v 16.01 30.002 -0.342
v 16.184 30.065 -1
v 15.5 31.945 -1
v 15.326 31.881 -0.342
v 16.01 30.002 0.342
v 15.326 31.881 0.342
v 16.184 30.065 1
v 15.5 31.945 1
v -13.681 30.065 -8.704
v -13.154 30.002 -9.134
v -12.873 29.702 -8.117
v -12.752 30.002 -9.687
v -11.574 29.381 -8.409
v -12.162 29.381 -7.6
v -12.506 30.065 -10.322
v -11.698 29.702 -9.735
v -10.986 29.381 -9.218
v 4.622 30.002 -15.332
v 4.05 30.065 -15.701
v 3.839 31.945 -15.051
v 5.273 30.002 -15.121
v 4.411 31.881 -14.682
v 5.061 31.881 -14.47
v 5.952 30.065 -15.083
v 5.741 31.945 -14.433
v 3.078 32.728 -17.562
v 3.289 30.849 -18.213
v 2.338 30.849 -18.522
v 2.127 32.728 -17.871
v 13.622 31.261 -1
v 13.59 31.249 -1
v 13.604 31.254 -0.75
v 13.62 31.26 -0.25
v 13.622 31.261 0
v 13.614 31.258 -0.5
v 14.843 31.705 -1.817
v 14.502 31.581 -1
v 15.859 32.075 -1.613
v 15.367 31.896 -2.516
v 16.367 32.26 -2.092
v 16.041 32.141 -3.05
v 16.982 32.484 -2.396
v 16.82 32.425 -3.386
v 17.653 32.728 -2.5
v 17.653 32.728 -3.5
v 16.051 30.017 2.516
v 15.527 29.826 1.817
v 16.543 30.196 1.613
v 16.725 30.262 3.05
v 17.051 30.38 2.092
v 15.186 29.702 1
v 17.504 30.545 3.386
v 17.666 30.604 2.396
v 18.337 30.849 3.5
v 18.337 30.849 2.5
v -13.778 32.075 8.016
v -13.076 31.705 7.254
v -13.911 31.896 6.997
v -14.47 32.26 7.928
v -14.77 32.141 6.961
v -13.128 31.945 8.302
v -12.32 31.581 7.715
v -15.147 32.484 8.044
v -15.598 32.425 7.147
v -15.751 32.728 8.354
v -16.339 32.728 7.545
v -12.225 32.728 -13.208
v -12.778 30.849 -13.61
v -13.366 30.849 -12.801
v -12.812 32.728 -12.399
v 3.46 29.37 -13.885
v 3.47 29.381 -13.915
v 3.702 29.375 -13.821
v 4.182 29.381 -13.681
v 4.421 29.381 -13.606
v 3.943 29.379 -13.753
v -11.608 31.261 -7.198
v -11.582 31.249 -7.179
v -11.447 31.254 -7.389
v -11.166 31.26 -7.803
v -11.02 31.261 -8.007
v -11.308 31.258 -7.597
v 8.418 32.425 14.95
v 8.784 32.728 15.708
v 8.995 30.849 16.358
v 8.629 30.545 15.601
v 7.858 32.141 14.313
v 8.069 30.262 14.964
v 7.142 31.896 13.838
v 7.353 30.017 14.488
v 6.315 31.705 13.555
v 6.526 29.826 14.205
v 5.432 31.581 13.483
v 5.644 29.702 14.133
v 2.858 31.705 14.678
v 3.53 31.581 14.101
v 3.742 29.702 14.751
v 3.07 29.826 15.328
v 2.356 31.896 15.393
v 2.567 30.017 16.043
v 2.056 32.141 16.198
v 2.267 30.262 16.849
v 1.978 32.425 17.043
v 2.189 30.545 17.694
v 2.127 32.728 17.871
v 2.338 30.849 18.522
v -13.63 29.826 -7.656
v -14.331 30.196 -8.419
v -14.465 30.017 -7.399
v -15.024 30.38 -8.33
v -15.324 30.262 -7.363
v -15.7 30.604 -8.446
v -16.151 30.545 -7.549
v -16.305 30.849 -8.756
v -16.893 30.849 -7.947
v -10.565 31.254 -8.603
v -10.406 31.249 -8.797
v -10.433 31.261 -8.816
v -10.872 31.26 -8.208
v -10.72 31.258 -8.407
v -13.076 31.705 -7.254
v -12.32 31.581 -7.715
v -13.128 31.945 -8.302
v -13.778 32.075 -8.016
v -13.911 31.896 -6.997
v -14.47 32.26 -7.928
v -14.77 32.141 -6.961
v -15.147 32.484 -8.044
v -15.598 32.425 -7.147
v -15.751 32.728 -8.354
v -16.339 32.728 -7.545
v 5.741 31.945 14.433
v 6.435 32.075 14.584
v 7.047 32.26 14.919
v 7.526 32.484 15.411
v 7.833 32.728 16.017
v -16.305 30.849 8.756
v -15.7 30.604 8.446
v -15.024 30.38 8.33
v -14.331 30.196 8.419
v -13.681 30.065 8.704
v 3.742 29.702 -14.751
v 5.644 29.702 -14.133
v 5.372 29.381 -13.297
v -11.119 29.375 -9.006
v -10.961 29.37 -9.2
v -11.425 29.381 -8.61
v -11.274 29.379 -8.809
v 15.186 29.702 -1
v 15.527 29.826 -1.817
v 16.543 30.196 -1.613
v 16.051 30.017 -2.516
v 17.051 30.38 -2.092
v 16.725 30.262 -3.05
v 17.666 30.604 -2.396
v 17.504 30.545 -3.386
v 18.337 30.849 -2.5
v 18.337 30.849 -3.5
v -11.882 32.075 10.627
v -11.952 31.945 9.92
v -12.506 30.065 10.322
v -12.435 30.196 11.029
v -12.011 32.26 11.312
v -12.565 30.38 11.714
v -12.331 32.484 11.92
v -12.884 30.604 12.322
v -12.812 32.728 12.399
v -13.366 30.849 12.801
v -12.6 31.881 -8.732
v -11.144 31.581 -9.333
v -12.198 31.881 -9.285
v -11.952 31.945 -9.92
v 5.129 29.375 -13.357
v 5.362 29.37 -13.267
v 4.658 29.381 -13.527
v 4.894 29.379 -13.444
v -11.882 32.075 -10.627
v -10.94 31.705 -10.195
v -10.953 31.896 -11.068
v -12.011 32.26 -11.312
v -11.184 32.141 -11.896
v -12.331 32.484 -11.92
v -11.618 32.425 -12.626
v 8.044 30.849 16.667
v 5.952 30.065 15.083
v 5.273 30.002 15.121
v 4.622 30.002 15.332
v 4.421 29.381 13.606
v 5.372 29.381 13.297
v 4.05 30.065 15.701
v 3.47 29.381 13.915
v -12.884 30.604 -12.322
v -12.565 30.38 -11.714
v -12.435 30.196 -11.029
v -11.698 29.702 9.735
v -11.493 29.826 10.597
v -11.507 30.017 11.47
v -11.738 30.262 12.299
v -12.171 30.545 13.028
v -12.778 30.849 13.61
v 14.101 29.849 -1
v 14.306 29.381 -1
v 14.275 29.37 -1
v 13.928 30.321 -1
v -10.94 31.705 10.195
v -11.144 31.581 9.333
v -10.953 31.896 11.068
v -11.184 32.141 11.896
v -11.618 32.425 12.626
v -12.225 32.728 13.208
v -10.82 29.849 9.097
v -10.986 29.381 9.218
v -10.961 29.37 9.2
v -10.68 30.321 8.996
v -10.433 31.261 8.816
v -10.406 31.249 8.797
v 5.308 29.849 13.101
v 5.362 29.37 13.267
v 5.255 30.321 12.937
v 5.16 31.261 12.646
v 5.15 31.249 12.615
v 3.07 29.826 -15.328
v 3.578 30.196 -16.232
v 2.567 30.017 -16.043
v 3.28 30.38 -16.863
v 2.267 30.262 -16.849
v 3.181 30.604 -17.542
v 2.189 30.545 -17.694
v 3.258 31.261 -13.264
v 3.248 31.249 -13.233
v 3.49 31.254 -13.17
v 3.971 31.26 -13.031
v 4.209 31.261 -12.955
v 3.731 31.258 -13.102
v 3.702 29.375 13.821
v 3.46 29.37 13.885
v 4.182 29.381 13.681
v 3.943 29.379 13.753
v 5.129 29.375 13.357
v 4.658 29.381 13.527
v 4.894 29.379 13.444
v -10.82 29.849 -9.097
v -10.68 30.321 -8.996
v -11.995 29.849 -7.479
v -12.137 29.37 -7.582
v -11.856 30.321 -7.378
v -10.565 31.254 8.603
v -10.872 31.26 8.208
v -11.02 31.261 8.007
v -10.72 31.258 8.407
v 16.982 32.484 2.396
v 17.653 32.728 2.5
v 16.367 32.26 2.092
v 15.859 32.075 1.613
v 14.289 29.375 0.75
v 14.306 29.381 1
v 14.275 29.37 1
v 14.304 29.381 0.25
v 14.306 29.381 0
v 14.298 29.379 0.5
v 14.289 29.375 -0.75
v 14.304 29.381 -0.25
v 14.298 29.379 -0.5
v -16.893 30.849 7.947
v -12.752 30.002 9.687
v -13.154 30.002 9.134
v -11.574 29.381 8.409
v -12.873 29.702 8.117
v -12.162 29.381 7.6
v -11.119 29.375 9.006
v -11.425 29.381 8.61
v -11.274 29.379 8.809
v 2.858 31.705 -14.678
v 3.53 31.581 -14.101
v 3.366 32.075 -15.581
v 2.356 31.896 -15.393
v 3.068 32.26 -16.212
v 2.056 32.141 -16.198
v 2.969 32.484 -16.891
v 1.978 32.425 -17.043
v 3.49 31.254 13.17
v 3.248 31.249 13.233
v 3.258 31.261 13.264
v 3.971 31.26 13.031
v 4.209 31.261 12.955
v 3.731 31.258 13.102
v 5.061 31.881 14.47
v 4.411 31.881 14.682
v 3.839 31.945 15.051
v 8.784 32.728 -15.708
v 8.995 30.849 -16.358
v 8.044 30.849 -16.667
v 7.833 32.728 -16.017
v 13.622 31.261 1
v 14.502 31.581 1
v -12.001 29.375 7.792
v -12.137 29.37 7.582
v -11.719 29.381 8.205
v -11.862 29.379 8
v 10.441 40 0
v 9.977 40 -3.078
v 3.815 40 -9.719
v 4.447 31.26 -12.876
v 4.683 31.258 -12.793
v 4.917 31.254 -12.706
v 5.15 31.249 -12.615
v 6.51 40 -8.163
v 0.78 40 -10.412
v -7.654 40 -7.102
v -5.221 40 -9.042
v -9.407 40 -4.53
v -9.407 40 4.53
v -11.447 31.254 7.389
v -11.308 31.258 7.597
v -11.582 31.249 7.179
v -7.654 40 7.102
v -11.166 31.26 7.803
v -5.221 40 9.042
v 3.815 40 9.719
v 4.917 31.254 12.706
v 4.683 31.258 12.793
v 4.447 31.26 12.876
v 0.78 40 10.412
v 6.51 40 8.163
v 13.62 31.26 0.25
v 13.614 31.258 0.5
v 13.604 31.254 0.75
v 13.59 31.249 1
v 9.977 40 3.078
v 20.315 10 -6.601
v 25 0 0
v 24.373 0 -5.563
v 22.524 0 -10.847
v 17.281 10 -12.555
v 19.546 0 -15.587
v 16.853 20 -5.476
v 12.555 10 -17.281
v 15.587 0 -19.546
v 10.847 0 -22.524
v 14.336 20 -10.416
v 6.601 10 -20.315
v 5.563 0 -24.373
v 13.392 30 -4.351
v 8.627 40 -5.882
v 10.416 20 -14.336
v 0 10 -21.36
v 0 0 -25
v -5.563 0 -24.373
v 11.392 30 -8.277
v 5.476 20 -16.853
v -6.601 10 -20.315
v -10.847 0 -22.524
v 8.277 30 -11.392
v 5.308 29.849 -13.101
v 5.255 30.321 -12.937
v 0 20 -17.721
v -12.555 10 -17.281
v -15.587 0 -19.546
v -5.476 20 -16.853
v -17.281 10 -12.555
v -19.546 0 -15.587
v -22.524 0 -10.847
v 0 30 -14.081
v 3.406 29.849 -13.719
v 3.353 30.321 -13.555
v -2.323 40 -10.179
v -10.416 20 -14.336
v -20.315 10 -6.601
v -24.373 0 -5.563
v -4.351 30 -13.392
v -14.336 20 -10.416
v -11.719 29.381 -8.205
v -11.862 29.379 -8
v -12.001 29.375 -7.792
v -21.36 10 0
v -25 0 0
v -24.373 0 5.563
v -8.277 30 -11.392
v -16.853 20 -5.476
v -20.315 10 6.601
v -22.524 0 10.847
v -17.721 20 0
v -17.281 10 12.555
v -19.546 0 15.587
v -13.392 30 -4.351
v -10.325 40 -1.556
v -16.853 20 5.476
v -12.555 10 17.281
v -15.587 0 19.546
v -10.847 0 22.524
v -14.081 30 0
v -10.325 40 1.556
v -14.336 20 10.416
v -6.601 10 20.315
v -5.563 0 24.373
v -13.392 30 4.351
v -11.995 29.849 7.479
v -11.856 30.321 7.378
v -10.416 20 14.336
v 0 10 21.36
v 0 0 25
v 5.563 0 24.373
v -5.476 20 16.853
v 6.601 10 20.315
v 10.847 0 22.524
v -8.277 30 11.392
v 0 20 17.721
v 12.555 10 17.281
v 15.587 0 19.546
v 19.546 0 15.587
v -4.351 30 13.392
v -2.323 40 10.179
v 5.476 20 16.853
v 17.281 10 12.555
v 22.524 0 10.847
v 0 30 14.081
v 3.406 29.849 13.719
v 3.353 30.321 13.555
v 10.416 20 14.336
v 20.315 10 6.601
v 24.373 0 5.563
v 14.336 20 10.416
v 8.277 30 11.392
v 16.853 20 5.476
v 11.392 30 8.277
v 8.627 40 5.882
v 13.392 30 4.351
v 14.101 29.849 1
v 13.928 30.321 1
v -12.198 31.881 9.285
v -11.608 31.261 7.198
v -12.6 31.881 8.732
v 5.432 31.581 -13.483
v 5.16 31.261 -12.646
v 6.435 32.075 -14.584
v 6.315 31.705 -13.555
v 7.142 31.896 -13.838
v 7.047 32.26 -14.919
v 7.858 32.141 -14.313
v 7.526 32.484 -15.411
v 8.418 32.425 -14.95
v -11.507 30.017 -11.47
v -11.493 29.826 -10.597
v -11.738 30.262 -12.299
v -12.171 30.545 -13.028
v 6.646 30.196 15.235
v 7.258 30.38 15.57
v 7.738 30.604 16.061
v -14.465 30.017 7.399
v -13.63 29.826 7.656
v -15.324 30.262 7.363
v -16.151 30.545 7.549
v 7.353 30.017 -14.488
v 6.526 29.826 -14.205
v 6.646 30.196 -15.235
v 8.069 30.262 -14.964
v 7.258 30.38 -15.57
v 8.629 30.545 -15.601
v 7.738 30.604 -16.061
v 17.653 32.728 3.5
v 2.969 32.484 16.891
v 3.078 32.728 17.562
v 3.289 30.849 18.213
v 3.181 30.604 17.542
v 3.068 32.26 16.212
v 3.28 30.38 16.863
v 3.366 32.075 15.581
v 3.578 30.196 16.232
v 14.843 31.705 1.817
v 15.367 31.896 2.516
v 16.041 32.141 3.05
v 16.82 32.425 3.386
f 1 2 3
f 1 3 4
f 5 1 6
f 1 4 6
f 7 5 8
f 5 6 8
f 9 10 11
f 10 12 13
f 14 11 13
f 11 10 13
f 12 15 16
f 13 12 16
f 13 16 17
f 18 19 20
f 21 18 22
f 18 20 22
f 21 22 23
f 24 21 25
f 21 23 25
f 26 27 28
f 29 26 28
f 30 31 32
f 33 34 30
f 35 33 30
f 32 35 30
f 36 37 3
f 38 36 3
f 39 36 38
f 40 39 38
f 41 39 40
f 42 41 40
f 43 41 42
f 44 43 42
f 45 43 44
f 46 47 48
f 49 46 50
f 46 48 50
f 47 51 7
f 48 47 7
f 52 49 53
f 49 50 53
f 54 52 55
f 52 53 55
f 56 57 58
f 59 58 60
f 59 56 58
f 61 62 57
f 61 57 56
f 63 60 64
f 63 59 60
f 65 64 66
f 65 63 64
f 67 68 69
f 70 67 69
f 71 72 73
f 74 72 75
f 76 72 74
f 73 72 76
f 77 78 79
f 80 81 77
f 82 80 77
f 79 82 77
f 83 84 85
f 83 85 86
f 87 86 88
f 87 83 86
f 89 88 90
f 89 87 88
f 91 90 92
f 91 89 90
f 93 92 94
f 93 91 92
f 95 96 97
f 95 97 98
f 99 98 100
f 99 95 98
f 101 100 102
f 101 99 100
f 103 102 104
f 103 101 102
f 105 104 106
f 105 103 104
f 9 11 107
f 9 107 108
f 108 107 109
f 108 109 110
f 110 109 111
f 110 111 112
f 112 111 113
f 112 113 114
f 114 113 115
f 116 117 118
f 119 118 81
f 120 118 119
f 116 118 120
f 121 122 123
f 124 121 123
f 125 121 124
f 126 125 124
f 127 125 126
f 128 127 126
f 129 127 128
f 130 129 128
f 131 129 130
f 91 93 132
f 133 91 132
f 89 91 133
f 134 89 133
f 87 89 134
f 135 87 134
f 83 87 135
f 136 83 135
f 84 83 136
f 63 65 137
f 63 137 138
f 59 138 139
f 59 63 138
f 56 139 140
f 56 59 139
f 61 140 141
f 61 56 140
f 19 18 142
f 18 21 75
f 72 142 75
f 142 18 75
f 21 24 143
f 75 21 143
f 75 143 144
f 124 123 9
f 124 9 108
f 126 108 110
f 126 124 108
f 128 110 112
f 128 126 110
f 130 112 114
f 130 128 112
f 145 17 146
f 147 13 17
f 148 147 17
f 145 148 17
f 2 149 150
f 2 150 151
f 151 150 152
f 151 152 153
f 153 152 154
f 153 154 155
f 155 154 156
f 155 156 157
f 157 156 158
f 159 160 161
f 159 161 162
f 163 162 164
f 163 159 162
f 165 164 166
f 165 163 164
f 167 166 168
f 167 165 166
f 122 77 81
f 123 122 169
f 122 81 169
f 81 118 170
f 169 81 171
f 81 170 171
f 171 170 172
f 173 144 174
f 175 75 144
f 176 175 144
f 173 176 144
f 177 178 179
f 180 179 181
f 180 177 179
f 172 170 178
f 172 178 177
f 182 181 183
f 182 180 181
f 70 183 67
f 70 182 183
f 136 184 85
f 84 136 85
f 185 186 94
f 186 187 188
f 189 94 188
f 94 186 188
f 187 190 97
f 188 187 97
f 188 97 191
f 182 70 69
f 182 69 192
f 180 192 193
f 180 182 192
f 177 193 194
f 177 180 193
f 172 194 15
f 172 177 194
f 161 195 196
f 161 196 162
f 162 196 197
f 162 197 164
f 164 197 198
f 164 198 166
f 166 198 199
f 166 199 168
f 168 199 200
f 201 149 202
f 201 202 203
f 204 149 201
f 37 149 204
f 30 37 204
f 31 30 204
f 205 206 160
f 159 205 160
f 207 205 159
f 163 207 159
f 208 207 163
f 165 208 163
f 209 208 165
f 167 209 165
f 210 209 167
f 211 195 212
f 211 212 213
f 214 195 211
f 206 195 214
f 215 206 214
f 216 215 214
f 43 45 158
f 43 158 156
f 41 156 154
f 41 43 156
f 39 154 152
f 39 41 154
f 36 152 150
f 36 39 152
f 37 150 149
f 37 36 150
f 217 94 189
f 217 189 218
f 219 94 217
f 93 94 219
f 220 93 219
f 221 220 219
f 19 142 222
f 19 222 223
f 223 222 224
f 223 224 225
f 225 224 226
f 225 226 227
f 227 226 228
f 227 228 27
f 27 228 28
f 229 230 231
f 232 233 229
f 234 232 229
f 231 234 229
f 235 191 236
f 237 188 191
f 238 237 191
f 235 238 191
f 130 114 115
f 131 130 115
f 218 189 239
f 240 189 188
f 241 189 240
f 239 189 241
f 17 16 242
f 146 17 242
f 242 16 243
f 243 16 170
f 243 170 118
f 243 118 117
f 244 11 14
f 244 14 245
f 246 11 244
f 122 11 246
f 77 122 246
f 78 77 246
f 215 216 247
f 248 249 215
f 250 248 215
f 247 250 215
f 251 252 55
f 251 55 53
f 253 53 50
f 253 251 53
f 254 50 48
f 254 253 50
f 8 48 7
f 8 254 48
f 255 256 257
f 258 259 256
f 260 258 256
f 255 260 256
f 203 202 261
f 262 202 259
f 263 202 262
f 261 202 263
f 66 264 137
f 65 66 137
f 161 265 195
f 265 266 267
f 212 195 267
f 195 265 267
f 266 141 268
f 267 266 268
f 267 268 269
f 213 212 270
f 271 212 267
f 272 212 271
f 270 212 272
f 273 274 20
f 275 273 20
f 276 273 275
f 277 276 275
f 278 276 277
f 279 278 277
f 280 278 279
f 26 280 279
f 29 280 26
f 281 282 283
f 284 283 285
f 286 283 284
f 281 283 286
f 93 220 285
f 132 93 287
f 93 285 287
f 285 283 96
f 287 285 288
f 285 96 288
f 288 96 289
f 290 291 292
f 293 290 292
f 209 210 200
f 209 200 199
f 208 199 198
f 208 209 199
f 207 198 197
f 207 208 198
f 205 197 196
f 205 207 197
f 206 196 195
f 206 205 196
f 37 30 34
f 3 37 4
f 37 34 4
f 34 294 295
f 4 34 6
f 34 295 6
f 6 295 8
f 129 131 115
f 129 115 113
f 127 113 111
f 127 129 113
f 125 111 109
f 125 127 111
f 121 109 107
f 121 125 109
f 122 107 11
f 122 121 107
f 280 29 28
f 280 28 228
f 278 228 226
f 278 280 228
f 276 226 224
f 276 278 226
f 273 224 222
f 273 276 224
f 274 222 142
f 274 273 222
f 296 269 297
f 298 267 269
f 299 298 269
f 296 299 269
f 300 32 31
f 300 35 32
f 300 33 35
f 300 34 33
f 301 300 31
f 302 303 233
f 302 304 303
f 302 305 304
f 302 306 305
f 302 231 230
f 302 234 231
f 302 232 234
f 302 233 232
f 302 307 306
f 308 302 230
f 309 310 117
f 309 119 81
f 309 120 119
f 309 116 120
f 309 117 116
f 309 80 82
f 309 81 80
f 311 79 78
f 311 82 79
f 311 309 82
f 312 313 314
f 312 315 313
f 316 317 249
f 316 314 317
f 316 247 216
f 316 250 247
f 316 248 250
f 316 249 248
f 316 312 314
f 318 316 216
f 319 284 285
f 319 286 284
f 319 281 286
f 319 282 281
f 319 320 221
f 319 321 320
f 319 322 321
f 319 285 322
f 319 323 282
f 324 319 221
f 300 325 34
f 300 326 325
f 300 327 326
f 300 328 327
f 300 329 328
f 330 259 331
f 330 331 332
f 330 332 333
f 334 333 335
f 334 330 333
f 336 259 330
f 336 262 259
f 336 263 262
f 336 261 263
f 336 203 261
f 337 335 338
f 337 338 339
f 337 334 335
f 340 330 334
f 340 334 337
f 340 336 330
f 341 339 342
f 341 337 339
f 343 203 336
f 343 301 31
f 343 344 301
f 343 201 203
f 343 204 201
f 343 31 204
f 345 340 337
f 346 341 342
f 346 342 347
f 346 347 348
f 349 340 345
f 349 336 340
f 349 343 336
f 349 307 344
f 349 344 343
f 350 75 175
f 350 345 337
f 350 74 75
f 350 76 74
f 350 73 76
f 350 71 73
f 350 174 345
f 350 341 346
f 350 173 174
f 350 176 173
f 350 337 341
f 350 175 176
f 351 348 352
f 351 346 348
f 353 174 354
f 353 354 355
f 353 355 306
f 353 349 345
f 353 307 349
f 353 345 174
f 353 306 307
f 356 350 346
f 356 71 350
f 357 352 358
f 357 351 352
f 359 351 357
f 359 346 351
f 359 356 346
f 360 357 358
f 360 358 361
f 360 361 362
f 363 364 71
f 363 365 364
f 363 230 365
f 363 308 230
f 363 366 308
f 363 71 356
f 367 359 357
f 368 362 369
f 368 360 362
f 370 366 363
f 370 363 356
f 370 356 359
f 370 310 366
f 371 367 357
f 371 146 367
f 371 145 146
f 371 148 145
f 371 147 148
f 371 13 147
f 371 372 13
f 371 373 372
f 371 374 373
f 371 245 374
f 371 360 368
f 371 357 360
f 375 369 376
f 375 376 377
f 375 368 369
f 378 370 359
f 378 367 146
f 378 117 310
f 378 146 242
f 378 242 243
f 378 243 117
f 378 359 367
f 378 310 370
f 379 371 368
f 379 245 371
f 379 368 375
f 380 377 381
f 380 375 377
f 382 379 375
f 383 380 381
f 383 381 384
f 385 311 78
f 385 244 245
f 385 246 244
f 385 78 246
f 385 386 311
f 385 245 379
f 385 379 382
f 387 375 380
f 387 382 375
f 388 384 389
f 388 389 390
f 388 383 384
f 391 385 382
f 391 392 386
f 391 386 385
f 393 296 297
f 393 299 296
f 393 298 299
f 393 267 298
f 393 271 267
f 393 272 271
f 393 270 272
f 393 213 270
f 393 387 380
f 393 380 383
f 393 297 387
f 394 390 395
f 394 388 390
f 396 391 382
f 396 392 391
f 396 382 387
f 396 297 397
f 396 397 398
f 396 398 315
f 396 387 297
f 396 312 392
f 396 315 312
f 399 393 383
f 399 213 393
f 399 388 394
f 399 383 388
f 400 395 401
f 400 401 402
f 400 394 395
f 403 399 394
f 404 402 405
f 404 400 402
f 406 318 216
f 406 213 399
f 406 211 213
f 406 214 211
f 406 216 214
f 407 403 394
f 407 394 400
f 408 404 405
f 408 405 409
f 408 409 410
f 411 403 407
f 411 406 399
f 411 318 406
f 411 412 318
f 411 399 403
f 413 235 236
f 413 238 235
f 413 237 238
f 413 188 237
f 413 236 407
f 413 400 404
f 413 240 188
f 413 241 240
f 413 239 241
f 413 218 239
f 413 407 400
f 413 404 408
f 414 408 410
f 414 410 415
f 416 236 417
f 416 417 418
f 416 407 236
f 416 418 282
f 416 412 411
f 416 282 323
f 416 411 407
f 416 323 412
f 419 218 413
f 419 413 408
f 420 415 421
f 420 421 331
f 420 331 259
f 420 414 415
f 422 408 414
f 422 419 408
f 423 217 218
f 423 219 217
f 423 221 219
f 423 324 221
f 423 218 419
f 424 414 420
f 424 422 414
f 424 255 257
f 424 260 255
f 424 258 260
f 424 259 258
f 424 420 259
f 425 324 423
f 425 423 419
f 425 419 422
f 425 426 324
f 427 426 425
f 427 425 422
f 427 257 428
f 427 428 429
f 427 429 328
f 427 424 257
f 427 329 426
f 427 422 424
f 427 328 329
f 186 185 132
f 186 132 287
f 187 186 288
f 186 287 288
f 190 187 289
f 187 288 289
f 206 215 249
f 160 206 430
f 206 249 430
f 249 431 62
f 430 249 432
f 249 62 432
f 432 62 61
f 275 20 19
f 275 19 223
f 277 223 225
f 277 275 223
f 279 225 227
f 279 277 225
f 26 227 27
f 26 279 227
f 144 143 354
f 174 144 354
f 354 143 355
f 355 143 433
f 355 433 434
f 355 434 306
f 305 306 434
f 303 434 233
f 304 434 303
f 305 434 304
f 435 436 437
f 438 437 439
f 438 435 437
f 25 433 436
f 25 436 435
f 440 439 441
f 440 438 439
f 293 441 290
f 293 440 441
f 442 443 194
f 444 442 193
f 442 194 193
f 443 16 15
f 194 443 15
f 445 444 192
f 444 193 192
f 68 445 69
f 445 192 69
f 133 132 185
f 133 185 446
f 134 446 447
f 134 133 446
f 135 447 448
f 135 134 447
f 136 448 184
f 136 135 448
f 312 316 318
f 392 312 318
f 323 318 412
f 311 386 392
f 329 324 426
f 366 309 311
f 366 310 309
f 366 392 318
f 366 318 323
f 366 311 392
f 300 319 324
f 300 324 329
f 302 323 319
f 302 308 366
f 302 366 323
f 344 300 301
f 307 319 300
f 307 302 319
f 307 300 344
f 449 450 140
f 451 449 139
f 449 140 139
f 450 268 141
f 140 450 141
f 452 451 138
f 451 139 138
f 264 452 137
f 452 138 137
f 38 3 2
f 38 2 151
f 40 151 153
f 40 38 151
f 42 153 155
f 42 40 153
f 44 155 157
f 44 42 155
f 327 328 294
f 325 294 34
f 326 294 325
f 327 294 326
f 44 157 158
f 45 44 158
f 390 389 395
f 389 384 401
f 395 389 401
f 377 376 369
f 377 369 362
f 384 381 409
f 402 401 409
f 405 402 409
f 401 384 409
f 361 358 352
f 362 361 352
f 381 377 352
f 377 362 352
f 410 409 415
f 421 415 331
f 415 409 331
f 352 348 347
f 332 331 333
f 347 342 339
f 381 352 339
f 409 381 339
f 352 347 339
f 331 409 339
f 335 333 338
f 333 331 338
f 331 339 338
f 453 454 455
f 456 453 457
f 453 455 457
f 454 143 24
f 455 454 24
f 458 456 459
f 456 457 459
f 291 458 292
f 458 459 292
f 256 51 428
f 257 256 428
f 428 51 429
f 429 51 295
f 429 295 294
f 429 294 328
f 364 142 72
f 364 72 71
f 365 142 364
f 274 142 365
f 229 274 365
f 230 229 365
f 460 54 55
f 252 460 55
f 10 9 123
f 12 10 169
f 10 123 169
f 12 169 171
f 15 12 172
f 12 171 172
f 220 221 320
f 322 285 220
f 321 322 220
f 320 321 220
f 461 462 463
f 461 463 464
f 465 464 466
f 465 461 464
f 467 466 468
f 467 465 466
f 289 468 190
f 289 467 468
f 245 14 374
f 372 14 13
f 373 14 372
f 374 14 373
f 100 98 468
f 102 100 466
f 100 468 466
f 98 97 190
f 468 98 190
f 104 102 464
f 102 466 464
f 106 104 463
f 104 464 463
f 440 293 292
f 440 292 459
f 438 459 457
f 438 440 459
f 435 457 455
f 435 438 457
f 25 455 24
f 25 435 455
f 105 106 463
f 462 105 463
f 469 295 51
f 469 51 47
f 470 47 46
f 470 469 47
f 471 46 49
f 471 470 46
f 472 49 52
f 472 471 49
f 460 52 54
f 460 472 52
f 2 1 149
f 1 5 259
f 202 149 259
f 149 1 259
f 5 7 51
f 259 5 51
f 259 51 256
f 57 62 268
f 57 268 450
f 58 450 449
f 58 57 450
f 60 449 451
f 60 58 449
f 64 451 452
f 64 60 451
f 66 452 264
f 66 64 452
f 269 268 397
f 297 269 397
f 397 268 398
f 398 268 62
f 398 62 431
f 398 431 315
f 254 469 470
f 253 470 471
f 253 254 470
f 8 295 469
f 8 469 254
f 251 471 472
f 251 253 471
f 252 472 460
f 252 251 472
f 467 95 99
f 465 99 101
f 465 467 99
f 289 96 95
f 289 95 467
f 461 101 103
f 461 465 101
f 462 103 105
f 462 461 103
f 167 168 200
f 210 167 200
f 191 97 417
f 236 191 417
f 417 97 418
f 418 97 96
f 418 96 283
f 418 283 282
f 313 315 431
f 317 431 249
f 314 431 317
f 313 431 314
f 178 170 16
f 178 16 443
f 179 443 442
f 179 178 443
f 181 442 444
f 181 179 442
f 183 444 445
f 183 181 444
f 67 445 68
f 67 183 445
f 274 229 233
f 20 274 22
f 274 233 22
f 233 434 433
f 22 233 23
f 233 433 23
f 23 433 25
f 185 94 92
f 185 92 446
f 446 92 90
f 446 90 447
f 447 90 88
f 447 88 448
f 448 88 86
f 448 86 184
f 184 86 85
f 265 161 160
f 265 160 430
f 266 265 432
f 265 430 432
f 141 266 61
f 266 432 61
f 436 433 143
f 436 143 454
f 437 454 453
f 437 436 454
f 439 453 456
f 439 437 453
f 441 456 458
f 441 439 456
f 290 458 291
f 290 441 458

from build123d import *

# Parameters (mm, degrees)
SKETCH1_R           = 25
BOSS_EXTRUDE1_DEPTH = 40
BOSS_EXTRUDE1_TAPER = 20
BOSS_EXTRUDE2_DEPTH = 1
BOSS_EXTRUDE3_DEPTH = 2
SKETCH3_3_R         = 2.5
CUT_EXTRUDE1_DEPTH  = 2
CIRPATTERN1_COUNT   = 5


with BuildPart() as part:
    # Sketch1 → Boss-Extrude1 (new body)
    with BuildSketch(Plane(origin=(0, 0, 0), x_dir=(1, 0, 0), z_dir=(0, 1, 0))):
        Circle(SKETCH1_R)
    extrude(amount=BOSS_EXTRUDE1_DEPTH, taper=BOSS_EXTRUDE1_TAPER)

    # Sketch2 → Boss-Extrude2 (add, symmetric)
    with BuildSketch(Plane.XY):
        Polygon((13.621977962, 31.260858627), (18.320441066, 32.970959343), (19.004481353, 31.091574102), (14.306018249, 29.381473385), (12.426633007, 28.697433098), (11.742592721, 30.57681834), align=None)
    boss_extrude2 = extrude(amount=BOSS_EXTRUDE2_DEPTH, both=True)

    # Sketch3 → Boss-Extrude3 (add)
    with BuildSketch(Plane(origin=(-8.453577577, 23.226013506, 0), x_dir=(0.9396926207859088, 0.34202014332566777, 0), z_dir=(-0.34202014332566777, 0.9396926207859089, 0))):
        with BuildLine():
            Line((27.78248584, 2.5), (27.78248584, 3.5))
            ThreePointArc((27.78248584, 3.5), (24.28248584, 0), (27.78248584, -3.5))
            Line((27.78248584, -3.5), (27.78248584, -2.5))
            ThreePointArc((27.78248584, -2.5), (25.28248584, 0), (27.78248584, 2.5))
        make_face()
    boss_extrude3 = extrude(amount=-BOSS_EXTRUDE3_DEPTH)

    # Sketch3<3> → Cut-Extrude1 (cut)
    with BuildSketch(Plane(origin=(-8.453577577, 23.226013506, 0), x_dir=(0.9396926207859088, 0.34202014332566777, 0), z_dir=(-0.34202014332566777, 0.9396926207859089, 0))):
        with Locations((27.78248584, 0)):
            Circle(SKETCH3_3_R)
    cut_extrude1 = extrude(amount=-CUT_EXTRUDE1_DEPTH, mode=Mode.SUBTRACT)

    # CirPattern1: Boss-Extrude2, Boss-Extrude3, Cut-Extrude1 ×5 about axis
    cirpattern1_axis = Axis((0, 40, 0), (0, 1, 0))
    add([boss_extrude2.rotate(cirpattern1_axis, i * 360 / CIRPATTERN1_COUNT) for i in range(1, CIRPATTERN1_COUNT)])
    add([boss_extrude3.rotate(cirpattern1_axis, i * 360 / CIRPATTERN1_COUNT) for i in range(1, CIRPATTERN1_COUNT)])
    add([cut_extrude1.rotate(cirpattern1_axis, i * 360 / CIRPATTERN1_COUNT) for i in range(1, CIRPATTERN1_COUNT)], mode=Mode.SUBTRACT)


solid = part.part
